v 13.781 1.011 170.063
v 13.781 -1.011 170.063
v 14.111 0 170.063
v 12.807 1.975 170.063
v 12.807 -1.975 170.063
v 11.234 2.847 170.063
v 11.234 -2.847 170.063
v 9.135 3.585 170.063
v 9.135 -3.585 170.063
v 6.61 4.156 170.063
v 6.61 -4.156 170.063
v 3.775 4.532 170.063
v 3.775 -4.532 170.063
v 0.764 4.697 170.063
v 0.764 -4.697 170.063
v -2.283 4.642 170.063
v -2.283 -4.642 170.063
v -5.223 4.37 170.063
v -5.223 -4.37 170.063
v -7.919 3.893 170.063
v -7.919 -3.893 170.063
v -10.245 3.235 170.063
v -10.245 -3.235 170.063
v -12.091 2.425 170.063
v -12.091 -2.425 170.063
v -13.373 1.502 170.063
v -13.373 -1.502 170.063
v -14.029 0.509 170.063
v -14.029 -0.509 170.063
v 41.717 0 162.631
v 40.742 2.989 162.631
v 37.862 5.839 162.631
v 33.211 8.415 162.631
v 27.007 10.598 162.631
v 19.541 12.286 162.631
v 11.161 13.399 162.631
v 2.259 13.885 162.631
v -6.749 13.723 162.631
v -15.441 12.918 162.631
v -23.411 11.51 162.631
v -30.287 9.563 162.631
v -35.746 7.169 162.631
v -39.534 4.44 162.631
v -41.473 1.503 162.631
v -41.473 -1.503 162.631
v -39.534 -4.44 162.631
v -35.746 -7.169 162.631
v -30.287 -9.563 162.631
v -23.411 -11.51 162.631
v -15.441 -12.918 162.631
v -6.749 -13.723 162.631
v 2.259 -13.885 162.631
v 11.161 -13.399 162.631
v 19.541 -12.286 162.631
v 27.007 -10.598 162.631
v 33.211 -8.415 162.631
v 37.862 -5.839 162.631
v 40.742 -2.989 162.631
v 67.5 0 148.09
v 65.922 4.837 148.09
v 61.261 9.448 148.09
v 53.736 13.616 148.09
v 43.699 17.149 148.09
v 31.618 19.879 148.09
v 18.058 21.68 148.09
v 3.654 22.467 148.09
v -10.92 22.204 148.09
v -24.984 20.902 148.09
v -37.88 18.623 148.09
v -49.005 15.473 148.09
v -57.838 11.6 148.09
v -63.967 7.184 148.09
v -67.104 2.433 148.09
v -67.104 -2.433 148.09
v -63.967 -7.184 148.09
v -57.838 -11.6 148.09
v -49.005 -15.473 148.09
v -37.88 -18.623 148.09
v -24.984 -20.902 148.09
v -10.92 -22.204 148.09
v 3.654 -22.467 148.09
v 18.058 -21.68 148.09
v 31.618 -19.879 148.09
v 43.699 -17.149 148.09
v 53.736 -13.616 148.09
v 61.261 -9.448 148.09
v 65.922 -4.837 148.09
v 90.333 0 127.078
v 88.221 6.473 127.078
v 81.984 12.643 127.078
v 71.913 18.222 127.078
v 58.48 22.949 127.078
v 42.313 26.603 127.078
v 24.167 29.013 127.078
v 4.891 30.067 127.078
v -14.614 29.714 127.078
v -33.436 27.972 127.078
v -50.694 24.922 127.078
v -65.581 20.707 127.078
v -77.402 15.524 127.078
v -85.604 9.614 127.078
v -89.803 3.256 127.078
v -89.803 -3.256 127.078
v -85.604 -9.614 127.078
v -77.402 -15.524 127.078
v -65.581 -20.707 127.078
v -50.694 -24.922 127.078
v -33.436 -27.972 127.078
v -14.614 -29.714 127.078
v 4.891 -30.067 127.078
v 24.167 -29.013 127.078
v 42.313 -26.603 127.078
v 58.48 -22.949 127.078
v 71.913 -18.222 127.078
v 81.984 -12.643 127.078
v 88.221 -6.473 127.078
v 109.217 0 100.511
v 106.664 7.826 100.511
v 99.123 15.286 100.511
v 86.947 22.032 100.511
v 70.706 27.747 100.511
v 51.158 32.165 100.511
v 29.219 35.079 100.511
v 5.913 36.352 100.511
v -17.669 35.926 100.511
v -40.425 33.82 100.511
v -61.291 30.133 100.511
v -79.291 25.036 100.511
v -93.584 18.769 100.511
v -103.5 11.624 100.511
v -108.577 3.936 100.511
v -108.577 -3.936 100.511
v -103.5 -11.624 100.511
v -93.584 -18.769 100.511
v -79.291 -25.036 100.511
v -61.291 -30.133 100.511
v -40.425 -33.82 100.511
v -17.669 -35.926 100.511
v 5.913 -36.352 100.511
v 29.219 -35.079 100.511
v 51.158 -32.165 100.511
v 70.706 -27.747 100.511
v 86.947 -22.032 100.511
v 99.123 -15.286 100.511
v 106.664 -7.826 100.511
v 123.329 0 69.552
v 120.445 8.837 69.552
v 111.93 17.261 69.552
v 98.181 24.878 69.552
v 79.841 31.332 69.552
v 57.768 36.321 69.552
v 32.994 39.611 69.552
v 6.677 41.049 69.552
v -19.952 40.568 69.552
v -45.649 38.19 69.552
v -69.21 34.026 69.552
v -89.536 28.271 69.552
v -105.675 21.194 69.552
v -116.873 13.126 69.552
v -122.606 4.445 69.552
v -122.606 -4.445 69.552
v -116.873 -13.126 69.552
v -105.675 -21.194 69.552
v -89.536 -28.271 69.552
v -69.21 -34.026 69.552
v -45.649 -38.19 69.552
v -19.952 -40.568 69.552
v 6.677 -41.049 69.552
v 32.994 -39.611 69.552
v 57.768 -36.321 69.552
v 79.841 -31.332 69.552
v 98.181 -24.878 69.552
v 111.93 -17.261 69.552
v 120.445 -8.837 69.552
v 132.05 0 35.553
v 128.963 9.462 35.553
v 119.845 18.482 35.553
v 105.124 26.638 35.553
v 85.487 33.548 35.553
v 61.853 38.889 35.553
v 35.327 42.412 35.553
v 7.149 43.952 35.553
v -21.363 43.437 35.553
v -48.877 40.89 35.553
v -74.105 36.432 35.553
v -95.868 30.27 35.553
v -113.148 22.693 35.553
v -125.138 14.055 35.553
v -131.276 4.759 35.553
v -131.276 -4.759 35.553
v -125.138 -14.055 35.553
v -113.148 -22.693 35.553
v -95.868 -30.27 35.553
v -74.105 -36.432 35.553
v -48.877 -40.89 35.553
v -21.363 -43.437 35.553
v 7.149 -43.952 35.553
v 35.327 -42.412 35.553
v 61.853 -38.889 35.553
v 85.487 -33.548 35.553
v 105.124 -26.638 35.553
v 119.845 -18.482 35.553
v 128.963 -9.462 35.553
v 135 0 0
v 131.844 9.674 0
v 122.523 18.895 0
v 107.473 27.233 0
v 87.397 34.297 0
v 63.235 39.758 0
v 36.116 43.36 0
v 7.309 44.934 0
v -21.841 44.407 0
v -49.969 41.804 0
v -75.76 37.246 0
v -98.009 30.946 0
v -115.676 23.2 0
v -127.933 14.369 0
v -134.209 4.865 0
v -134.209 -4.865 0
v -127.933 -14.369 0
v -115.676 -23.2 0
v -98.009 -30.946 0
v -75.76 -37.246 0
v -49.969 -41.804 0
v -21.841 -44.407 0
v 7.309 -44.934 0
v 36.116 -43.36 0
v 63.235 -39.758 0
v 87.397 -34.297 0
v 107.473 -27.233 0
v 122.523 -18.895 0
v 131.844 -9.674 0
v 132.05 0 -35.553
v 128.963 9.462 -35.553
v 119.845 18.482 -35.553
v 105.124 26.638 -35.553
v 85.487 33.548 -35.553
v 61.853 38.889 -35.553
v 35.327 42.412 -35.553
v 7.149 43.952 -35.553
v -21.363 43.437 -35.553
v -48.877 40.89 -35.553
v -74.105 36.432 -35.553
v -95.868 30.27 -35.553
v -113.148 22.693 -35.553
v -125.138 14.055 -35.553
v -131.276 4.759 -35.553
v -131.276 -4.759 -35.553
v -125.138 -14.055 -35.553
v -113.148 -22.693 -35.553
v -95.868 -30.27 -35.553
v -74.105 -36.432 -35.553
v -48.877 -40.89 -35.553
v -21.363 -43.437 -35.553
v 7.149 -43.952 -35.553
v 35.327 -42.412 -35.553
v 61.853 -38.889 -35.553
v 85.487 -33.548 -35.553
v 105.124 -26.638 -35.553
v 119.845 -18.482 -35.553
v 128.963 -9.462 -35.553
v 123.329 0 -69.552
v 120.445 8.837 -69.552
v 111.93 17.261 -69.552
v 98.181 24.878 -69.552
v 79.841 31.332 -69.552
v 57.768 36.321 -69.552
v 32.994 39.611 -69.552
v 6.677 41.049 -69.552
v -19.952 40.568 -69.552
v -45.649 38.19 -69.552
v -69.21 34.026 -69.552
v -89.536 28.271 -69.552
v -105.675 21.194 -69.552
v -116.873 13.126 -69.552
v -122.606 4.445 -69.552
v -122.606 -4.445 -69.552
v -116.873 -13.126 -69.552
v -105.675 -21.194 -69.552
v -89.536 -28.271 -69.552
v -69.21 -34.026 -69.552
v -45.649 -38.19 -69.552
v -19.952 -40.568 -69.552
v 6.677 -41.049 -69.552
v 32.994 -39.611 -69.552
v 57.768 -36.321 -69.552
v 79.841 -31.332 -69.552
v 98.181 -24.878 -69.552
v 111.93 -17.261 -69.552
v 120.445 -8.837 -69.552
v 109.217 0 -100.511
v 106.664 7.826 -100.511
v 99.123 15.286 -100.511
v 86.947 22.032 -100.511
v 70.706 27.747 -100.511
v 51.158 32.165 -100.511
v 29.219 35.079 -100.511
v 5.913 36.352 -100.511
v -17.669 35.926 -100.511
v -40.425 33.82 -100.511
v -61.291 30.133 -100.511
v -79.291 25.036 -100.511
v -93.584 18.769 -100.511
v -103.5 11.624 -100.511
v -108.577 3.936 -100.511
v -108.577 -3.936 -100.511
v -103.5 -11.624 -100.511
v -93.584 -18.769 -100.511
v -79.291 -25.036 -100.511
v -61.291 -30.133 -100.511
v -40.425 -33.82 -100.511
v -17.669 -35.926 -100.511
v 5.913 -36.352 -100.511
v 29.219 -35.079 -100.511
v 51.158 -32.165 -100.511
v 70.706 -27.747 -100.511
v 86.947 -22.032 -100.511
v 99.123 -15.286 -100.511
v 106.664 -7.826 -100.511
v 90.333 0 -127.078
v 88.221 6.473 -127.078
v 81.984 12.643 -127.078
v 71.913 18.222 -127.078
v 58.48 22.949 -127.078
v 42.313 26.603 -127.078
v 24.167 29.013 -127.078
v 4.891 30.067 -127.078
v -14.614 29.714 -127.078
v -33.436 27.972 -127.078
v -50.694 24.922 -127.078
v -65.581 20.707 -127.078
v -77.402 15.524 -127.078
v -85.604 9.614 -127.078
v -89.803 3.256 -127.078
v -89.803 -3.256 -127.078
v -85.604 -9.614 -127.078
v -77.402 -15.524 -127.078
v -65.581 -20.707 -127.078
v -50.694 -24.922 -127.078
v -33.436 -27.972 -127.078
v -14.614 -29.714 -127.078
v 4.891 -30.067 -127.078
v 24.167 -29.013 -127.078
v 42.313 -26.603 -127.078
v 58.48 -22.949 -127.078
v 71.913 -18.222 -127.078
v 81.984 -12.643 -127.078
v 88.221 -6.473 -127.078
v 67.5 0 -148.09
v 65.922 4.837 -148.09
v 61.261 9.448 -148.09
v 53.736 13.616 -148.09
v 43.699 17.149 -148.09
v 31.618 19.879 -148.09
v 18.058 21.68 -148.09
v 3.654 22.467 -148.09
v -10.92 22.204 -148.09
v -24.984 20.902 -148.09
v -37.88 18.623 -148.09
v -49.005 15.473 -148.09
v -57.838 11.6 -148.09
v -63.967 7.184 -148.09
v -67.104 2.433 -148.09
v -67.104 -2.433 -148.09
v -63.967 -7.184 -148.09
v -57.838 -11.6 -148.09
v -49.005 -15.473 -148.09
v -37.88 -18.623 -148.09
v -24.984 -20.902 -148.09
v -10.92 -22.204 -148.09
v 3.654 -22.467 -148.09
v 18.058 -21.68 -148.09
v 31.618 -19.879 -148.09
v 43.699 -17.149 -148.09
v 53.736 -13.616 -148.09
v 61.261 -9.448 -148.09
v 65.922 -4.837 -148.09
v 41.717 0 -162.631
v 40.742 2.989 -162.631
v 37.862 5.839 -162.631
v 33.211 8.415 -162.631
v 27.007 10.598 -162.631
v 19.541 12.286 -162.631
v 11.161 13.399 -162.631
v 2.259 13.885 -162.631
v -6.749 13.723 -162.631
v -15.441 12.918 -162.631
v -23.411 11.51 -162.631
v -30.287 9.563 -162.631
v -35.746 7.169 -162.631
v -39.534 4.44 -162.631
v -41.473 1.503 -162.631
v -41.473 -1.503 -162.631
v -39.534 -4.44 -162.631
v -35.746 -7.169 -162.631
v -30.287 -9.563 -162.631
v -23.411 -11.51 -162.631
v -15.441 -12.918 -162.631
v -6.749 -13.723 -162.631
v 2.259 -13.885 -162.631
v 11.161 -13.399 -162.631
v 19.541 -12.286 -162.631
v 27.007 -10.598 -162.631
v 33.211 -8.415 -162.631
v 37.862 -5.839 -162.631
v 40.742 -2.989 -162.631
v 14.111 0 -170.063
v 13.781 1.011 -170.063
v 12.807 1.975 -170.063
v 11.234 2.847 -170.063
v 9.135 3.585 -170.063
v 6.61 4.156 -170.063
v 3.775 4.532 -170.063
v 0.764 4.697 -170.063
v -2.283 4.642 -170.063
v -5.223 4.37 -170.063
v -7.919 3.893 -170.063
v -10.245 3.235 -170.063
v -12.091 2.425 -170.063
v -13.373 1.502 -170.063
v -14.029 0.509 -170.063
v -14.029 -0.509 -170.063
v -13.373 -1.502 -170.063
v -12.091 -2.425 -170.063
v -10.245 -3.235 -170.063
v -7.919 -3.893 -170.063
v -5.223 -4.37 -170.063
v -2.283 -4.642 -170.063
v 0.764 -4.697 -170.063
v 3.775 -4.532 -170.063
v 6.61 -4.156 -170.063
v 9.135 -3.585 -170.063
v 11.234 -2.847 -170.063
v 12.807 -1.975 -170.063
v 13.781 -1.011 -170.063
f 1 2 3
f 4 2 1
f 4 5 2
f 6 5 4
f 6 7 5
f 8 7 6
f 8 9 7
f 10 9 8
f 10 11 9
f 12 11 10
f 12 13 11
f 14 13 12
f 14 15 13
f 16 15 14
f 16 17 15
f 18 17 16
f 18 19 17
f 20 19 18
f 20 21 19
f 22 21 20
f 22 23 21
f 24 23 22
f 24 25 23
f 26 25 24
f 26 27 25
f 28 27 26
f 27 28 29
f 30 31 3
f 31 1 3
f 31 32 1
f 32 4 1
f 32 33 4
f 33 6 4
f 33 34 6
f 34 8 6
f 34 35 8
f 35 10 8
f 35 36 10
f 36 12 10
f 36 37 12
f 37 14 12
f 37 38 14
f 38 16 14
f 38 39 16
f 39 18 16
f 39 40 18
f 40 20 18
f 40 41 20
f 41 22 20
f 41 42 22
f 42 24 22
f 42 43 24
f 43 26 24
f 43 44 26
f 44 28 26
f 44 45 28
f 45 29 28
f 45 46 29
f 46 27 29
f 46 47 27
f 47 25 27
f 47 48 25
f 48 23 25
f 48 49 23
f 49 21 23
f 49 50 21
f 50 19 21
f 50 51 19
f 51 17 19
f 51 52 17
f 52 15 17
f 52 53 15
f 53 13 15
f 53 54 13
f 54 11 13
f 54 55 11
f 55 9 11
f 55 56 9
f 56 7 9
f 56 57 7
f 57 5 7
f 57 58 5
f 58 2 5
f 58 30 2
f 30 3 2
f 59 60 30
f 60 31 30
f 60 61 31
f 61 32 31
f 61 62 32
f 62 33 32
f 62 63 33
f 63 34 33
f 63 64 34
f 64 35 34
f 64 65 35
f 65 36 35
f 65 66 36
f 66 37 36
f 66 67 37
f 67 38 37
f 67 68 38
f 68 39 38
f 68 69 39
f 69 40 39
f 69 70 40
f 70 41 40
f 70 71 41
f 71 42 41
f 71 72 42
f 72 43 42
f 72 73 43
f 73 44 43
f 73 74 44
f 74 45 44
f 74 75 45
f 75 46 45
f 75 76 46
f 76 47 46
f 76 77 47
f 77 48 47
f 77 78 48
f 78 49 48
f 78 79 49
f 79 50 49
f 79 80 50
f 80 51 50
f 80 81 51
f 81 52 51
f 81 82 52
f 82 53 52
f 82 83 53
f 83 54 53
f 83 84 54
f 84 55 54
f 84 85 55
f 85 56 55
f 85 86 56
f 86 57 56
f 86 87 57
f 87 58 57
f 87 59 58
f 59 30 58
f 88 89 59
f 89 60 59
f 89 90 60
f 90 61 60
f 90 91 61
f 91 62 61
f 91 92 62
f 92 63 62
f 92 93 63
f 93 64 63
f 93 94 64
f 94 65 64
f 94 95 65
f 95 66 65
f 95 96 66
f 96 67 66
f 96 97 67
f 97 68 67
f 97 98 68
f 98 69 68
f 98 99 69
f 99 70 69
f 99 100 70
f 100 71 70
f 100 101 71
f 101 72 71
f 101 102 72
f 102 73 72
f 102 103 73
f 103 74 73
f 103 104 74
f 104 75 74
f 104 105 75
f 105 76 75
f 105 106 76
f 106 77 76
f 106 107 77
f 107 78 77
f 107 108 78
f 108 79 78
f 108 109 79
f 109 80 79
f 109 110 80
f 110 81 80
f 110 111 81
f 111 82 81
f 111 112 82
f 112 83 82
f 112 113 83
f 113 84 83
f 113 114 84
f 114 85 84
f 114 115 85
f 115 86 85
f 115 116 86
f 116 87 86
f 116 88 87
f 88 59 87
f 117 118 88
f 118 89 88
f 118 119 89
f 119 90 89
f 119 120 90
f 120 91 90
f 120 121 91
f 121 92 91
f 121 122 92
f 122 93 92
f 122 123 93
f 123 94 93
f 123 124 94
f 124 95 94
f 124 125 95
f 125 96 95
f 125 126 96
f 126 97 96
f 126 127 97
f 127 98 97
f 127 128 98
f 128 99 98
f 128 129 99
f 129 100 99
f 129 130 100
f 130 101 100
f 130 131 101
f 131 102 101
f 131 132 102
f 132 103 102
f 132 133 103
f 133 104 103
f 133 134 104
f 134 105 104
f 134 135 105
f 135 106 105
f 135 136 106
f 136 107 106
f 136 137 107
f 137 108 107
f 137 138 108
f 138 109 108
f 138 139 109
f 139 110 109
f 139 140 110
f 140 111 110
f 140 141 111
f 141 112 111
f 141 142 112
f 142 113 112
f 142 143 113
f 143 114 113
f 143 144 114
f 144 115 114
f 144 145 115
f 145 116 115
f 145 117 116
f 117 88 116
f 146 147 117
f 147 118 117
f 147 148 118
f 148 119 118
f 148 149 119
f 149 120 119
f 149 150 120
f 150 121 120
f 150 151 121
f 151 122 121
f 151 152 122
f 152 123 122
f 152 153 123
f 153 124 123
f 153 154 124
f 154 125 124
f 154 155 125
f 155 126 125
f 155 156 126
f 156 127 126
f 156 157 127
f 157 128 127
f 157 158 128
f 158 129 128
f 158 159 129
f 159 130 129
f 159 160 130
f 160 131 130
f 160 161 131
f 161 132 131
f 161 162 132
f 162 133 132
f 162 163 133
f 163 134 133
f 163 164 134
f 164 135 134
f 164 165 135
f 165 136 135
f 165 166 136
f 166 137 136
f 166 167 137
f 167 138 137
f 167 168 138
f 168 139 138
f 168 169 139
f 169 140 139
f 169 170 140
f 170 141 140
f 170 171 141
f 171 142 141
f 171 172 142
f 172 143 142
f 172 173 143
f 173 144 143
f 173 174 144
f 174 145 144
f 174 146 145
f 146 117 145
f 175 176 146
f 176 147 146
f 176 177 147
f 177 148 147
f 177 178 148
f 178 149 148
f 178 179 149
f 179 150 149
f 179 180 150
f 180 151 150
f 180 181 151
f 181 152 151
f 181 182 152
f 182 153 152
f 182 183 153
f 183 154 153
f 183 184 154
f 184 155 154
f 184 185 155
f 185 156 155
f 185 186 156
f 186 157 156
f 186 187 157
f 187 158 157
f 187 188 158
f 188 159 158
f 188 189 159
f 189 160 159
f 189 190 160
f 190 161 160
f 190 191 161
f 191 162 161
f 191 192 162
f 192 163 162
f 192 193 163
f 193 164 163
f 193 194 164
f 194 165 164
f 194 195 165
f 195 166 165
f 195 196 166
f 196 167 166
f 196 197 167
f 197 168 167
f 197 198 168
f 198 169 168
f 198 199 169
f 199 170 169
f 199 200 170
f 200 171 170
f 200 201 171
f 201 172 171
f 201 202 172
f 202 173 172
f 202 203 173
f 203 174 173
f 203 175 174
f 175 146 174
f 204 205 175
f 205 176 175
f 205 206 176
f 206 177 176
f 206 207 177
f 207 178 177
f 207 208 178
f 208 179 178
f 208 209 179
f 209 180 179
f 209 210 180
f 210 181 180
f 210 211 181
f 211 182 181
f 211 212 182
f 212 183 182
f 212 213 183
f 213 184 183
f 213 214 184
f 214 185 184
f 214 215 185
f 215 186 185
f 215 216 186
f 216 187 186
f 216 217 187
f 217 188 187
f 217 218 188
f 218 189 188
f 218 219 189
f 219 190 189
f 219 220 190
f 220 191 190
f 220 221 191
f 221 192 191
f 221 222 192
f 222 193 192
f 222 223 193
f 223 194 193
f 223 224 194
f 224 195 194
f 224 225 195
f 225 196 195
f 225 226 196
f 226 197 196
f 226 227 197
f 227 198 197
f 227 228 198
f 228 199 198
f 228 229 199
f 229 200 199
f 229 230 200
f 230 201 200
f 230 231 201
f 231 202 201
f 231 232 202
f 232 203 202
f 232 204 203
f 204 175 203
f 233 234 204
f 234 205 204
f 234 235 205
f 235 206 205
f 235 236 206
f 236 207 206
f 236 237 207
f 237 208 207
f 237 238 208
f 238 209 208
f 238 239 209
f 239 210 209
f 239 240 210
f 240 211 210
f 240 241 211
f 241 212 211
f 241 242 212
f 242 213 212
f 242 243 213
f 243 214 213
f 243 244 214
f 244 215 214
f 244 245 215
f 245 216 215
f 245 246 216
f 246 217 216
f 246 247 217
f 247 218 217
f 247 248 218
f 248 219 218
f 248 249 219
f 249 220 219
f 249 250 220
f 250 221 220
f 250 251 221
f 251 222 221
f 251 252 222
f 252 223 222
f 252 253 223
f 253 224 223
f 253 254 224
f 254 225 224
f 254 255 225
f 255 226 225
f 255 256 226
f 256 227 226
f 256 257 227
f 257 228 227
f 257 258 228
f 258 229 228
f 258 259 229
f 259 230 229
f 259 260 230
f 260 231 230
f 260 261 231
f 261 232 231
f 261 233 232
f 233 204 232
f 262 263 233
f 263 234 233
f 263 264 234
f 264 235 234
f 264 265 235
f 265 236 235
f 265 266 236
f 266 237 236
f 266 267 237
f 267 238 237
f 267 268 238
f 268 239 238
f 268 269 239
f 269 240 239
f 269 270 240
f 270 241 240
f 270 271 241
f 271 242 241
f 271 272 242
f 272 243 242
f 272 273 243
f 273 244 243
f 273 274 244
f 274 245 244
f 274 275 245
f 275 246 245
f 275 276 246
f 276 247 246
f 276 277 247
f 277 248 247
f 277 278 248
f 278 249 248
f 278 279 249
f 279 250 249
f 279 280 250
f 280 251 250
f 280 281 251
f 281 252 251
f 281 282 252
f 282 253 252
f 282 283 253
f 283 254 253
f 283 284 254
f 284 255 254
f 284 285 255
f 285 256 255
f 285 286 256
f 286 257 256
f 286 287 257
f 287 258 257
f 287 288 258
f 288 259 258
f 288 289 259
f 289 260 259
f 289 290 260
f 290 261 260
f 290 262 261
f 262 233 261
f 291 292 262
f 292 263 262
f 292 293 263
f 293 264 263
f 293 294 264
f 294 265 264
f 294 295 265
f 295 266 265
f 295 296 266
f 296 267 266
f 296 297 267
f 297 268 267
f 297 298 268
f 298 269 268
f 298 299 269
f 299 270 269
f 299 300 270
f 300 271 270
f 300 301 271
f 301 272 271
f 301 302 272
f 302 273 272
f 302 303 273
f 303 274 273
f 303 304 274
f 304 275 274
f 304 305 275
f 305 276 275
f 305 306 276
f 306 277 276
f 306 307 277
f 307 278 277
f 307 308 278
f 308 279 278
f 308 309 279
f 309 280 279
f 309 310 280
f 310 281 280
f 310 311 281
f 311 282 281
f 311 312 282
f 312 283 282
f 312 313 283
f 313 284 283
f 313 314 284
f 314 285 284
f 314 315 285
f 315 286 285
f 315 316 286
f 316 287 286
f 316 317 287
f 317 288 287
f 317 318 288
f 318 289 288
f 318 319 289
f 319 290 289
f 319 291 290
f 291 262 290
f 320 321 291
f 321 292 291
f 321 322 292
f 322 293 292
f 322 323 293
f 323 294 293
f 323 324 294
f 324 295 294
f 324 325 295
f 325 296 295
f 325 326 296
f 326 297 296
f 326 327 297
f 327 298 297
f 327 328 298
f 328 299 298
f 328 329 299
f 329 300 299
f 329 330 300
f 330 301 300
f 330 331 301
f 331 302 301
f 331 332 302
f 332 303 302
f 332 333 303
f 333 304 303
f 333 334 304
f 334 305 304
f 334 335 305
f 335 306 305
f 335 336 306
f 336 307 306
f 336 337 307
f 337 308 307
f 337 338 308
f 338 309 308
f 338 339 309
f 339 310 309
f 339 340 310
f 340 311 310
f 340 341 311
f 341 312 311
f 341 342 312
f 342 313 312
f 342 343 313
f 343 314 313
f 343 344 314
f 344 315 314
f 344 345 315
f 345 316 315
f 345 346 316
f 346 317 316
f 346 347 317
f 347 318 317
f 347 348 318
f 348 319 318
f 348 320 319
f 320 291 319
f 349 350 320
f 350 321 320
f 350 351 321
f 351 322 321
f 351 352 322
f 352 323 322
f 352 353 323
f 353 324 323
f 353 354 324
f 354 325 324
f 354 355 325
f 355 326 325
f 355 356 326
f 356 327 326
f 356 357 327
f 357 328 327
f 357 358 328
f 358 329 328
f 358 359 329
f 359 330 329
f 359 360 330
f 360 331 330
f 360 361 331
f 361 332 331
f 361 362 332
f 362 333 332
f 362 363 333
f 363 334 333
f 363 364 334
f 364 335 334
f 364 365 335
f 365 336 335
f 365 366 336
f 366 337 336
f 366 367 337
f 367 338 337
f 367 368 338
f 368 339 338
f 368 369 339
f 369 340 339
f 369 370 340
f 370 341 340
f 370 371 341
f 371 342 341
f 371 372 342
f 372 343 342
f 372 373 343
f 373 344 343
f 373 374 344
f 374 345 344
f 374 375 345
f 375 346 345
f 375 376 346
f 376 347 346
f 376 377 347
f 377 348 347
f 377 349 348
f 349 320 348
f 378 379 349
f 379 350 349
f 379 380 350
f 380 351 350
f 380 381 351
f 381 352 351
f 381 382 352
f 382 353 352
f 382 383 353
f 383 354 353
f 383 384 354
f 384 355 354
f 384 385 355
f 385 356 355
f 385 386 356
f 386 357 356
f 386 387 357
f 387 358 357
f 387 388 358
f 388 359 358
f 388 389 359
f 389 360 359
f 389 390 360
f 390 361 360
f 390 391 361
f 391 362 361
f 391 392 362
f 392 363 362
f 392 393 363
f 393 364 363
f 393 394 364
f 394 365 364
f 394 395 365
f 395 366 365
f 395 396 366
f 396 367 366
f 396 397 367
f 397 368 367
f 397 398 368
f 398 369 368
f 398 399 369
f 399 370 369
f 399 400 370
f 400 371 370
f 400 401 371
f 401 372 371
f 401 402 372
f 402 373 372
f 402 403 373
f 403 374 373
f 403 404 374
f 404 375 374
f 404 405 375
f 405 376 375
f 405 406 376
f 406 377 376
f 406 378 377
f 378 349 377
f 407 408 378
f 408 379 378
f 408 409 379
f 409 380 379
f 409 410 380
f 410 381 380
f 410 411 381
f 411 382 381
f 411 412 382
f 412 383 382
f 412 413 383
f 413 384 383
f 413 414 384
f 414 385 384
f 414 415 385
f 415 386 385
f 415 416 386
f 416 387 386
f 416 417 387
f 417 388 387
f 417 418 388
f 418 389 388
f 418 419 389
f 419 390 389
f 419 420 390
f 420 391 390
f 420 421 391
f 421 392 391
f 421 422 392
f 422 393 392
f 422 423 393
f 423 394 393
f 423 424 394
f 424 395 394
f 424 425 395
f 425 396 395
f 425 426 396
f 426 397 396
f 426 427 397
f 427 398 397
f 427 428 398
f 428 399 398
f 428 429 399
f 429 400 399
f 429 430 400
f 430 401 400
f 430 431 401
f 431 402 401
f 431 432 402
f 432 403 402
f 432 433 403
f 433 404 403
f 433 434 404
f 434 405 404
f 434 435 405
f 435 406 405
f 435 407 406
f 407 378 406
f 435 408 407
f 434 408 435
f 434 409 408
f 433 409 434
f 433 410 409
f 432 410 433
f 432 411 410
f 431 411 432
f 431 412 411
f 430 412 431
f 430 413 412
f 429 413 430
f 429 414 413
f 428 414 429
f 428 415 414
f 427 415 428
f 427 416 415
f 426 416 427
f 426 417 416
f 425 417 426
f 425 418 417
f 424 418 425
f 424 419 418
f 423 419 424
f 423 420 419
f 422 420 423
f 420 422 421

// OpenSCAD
// Generated by SolidPython 1.0.1 on 2020-07-29 00:46:51


scale(v = [15, 5, 19]) {
	sphere(r = 9);
}
/***********************************************
*********      SolidPython code:      **********
************************************************
 
# import packages: SolidPython
from solid import *
from solid.utils import *
from itertools import chain, combinations, permutations


class Resize:

    def __init__(self, scad_file):
        self.scad_file = scad_file
        #self.scad_file = import_scad(scad_file)
        # cone/cylinder param:
        self.r1 = 0
        self.r2 = 0
        self.h = 0
        # rectangular prism param:
        self.w = 0
        self.l = 0
        # ellipse param:
        self.r = 0

    # import OpenScad code (file name corresponds to shape)


    # classify shape + parameters
    def assign(self, param1, param2, param3):
        if self.scad_file == 'cone.scad':
            self.r1 = param1
            self.r2 = param2
            self.h = param3
        elif self.scad_file == 'cylinder.scad':
            self.r1 = param1
            self.r2 = param2
            self.h = param3
        elif self.scad_file == 'rectangularPrism.scad':
            self.h = param1
            self.l = param2
            self.w = param3
        else:
            self.r = param1
            self.h = param2

    # resize parameters
    def iterate(self):
        x = range(3, 20, 2)
        i = 1
        if self.scad_file == 'cone.scad':
            tempList = list(permutations(x, 2))
            for temp in tempList:
                param1 = temp[0]
                param2 = temp[1]
                filepath = 'produced_scad_files/' + 'cone' + str(param1) + '_' + str(param2) + '_' + '.scad'
                scad_render_to_file(cylinder(h=param1, r1=param2, r2=0), filepath)

        elif self.scad_file == 'cylinder.scad':
            tempList = list(permutations(x, 3))
            for temp in tempList:
                param1 = temp[0]
                param2 = temp[1]
                filepath = 'produced_scad_files/' + 'cylinder' + str(param1) + '_' + str(param2) + '_' + '.scad'
                scad_render_to_file(cylinder(h=param1, r1=param2, r2=param2), filepath)

        elif self.scad_file == 'rectangularPrism.scad':
            tempList = list(permutations(x, 3))
            for temp in tempList:
                param1 = temp[0]
                param2 = temp[1]
                param3 = temp[2]
                filepath = 'produced_scad_files/' + 'rectangularPrism' + str(param1) + '_' + str(param2) + '_' + str(
                    param3) + '.scad'
                scad_render_to_file(cube(size=(param1, param2, param3)), filepath)

        elif self.scad_file == 'ellipse.scad':
            tempList = list(permutations(x, 4))
            for temp in tempList:
                param1 = temp[0]
                param2 = temp[1]
                param3 = temp[2]
                param4 = temp[3]
                filepath = 'produced_scad_files/' + 'ellipse' + str(param1) + '_' + str(param2) + '_' + str(param3) + '_' + str(param4) + '.scad'
                scad_render_to_file(scale([param1, param2, param3])(sphere(r=param4)), filepath)

    def render_to_scadfile(self):
        scad_render_to_file(scad, 'example.scad') 
 
************************************************/
